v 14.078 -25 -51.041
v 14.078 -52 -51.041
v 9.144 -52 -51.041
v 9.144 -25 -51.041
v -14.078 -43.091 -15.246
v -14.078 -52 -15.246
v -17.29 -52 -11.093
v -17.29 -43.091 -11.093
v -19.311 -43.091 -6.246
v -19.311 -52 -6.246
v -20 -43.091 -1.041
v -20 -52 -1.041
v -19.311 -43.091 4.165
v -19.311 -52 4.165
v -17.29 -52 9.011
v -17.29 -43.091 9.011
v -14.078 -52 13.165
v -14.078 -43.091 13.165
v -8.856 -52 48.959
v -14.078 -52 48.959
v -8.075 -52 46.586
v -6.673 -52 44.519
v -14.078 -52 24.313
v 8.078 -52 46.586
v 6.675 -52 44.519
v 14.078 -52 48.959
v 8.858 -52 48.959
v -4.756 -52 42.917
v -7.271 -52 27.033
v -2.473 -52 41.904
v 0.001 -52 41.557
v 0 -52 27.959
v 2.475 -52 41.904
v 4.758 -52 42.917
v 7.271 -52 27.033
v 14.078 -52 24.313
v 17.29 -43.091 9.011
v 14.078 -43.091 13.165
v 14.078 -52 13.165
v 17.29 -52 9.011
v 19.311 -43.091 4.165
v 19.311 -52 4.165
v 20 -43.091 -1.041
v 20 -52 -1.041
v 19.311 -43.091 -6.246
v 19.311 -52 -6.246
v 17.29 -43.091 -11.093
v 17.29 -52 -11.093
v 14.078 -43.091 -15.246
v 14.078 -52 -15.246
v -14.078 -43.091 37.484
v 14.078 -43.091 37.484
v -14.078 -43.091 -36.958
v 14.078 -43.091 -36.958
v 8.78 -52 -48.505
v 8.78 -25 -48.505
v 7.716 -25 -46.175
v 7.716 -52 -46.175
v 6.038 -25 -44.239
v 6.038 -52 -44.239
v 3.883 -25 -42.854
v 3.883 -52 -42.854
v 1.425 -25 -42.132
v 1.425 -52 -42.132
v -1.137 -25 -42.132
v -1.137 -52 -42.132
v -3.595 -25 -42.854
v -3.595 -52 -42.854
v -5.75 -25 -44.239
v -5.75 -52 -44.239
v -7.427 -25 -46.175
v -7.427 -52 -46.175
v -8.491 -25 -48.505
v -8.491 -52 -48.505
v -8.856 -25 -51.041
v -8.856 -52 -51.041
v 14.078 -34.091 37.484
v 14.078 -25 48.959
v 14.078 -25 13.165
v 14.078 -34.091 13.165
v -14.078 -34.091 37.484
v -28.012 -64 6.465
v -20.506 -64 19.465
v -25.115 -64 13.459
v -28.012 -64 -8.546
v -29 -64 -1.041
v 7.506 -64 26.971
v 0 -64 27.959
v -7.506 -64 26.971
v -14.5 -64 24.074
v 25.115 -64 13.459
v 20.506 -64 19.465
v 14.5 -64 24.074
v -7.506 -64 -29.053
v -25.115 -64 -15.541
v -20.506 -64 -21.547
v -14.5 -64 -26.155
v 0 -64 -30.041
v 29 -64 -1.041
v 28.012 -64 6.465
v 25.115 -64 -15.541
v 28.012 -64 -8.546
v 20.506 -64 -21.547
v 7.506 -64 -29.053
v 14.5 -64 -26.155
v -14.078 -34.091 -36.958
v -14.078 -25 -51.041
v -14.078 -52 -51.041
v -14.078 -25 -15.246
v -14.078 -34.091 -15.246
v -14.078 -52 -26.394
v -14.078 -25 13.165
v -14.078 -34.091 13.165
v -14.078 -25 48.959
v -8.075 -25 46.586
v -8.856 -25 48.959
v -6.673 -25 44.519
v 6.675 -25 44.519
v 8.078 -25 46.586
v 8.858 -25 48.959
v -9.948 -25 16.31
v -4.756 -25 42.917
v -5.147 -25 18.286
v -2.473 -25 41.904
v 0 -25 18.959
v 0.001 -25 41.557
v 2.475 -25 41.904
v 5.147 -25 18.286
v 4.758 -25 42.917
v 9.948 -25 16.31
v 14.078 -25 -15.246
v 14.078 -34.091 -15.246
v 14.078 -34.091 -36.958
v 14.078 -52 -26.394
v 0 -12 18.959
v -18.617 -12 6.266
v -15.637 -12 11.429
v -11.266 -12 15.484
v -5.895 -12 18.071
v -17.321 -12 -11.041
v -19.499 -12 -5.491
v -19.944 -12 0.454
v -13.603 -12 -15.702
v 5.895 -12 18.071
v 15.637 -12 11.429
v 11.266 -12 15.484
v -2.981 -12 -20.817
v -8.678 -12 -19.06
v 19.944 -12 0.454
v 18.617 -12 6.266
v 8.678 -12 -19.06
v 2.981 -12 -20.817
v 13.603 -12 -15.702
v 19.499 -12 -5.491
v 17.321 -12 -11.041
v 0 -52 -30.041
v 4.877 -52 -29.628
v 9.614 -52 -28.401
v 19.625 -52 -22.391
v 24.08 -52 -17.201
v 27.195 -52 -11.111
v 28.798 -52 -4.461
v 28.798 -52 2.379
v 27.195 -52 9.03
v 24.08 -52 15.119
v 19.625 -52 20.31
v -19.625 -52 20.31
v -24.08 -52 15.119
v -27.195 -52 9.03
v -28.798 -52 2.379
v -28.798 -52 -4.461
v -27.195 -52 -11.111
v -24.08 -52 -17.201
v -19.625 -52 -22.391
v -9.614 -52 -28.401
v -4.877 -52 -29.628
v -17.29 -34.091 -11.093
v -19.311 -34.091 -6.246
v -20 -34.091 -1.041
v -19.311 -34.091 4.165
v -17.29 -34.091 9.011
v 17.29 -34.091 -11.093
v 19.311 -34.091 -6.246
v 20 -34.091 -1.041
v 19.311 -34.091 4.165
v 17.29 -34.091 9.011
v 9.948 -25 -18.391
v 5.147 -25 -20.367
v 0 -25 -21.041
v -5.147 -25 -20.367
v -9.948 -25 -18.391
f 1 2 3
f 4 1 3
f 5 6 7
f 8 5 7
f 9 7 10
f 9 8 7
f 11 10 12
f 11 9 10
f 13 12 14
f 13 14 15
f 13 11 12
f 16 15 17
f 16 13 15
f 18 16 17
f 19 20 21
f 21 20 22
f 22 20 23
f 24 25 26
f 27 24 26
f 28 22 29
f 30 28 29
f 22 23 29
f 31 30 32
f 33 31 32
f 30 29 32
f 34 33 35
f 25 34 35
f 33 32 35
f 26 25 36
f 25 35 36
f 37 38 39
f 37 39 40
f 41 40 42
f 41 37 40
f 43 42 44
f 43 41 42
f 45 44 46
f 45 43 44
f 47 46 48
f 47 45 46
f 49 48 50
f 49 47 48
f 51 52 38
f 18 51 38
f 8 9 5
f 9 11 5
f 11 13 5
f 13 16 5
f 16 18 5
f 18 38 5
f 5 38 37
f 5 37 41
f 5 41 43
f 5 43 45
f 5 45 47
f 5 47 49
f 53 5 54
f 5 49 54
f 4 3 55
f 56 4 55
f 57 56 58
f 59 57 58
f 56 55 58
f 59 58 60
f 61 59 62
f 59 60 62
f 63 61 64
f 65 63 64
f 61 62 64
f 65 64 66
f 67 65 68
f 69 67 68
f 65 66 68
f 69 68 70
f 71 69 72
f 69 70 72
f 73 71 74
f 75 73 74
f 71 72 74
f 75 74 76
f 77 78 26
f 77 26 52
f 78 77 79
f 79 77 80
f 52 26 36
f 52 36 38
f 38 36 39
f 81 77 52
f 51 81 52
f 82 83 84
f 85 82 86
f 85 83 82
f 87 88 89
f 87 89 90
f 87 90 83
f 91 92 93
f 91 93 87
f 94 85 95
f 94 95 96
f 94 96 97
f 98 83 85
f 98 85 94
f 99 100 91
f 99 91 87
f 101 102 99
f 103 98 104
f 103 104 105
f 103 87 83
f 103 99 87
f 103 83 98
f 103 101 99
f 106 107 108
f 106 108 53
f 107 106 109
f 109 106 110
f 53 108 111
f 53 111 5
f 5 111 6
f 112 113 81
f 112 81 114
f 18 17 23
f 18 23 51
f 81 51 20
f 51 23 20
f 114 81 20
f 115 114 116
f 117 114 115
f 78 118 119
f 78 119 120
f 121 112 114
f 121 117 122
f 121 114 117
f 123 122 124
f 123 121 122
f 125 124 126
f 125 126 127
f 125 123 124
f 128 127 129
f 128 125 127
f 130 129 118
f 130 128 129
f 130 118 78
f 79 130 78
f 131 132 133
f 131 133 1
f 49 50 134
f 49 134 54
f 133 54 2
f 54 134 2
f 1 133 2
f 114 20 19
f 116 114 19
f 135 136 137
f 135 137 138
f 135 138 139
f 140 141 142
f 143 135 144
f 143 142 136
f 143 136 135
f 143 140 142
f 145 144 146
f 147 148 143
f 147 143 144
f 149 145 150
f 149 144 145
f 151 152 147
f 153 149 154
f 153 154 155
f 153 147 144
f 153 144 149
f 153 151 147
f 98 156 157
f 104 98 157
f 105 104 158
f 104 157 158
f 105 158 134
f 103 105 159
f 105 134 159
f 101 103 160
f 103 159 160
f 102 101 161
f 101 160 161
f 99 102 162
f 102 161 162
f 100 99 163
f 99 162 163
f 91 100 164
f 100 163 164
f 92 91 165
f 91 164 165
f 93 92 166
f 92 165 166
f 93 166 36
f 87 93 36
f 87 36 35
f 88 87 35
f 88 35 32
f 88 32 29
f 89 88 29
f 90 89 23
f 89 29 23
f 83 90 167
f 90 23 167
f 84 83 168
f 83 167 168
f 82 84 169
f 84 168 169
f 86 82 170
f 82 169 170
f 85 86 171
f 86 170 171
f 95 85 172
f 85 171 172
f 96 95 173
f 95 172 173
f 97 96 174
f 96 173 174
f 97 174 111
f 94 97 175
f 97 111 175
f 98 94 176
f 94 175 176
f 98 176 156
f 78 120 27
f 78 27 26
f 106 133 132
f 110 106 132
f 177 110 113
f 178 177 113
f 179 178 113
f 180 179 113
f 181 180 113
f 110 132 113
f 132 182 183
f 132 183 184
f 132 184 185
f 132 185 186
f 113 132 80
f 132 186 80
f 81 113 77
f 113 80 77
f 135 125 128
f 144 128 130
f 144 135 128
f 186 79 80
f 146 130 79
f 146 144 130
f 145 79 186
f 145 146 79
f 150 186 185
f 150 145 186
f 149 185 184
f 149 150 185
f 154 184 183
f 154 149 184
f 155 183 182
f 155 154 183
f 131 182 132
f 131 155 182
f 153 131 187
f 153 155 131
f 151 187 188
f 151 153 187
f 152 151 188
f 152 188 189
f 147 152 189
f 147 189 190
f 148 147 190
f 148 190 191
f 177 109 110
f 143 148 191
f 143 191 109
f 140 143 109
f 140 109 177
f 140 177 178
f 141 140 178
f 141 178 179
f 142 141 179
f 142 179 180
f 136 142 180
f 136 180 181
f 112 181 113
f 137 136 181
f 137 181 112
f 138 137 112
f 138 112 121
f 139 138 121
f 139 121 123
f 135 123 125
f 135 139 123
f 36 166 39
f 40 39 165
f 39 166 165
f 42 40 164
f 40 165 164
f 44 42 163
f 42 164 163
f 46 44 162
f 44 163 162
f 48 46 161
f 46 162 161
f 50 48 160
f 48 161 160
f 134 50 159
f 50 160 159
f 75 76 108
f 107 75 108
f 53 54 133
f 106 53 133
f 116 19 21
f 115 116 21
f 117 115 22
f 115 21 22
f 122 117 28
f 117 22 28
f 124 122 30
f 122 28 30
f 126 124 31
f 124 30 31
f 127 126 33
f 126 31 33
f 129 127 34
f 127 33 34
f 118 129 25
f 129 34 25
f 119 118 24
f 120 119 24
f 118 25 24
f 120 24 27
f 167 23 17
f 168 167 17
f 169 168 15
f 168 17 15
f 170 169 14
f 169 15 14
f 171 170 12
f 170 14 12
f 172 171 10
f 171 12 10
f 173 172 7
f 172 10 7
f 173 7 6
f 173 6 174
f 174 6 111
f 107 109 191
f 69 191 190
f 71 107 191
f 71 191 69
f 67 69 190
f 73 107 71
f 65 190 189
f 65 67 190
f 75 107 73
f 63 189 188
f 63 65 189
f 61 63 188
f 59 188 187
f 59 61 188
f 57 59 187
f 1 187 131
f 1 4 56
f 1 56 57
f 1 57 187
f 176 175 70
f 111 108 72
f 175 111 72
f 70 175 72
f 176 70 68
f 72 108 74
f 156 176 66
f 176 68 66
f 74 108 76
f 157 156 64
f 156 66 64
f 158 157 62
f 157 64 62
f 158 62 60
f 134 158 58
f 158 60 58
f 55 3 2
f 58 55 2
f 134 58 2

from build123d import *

# Parameters (mm, degrees)
SKETCH1_R           = 20
BOSS_EXTRUDE1_DEPTH = 52
SKETCH2_R           = 29
BOSS_EXTRUDE2_DEPTH = 12
BOSS_EXTRUDE3_DEPTH = 27
CUT_EXTRUDE1_DEPTH  = 93.503464219
SKETCH8_W           = 28.411423822
SKETCH8_H           = 9
CUT_EXTRUDE2_DEPTH  = 26
SKETCH9_R           = 20.095724015
CUT_EXTRUDE3_DEPTH  = 12


with BuildPart() as part:
    # Sketch1 → Boss-Extrude1 (new body)
    with BuildSketch(Plane(origin=(0, 0, 0), x_dir=(1, 0, 0), z_dir=(0, 1, 0))):
        with Locations(Location((0, 1.040702914, 0), (0, 0, 270))):
            Circle(SKETCH1_R)
    extrude(amount=-BOSS_EXTRUDE1_DEPTH)

    # Sketch2 → Boss-Extrude2 (add)
    with BuildSketch(Plane.XZ.offset(52)):
        with Locations(Location((0, -1.040702914, 0), (0, 0, 270))):
            Circle(SKETCH2_R)
    extrude(amount=BOSS_EXTRUDE2_DEPTH)

    # Sketch5 → Boss-Extrude3 (add)
    with BuildSketch(Plane(origin=(0, -52, 0), x_dir=(1, 0, 0), z_dir=(0, 1, 0))):
        with BuildLine():
            Line((14.078272234, -13.165008997), (-14.078272234, -13.165008997))
            Line((-14.078272234, -13.165008997), (-14.078272234, -48.959297086))
            Line((-14.078272234, -48.959297086), (-8.855775068, -48.959297086))
            ThreePointArc((-8.855775068, -48.959297086), (0.001248583, -41.557149408), (8.858272234, -48.959297086))
            Line((8.858272234, -48.959297086), (14.078272234, -48.959297086))
            Line((14.078272234, -48.959297086), (14.078272234, -13.165008997))
        make_face()
        with BuildLine():
            Line((-14.078272234, 51.040702914), (-14.078272234, 15.246414825))
            Line((-14.078272234, 15.246414825), (14.078272234, 15.246414825))
            Line((14.078272234, 15.246414825), (14.078272234, 51.040702914))
            Line((14.078272234, 51.040702914), (9.144224932, 51.040702914))
            ThreePointArc((9.144224932, 51.040702914), (0.144224932, 42.040702914), (-8.855775068, 51.040702914))
            Line((-8.855775068, 51.040702914), (-14.078272234, 51.040702914))
        make_face()
    extrude(amount=BOSS_EXTRUDE3_DEPTH)

    # Sketch6 → Cut-Extrude1 (cut, through all)
    with BuildSketch(Plane(origin=(14.078272234, 0, 0), x_dir=(0, 0, -1), z_dir=(1, 0, 0))):
        Polygon((-13.165008997, -34.09107024), (-37.484236428, -34.09107024), (-37.484236428, -43.09107024), (36.957800208, -43.09107024), (36.957800208, -34.09107024), align=None)
    extrude(amount=-CUT_EXTRUDE1_DEPTH, mode=Mode.SUBTRACT)

    # Sketch8 → Cut-Extrude2 (cut, symmetric)
    with BuildSketch(Plane(origin=(0, 0, 0), x_dir=(0, 0, -1), z_dir=(1, 0, 0))):
        with Locations((1.040702914, -38.59107024)):
            Rectangle(SKETCH8_W, SKETCH8_H)
    extrude(amount=CUT_EXTRUDE2_DEPTH, both=True, mode=Mode.SUBTRACT)

    # Sketch9 → Cut-Extrude3 (cut)
    with BuildSketch(Plane(origin=(0, 0, 0), x_dir=(1, 0, 0), z_dir=(0, 1, 0))):
        with Locations((0, 1.040702914)):
            Circle(SKETCH9_R)
    extrude(amount=-CUT_EXTRUDE3_DEPTH, mode=Mode.SUBTRACT)


solid = part.part
